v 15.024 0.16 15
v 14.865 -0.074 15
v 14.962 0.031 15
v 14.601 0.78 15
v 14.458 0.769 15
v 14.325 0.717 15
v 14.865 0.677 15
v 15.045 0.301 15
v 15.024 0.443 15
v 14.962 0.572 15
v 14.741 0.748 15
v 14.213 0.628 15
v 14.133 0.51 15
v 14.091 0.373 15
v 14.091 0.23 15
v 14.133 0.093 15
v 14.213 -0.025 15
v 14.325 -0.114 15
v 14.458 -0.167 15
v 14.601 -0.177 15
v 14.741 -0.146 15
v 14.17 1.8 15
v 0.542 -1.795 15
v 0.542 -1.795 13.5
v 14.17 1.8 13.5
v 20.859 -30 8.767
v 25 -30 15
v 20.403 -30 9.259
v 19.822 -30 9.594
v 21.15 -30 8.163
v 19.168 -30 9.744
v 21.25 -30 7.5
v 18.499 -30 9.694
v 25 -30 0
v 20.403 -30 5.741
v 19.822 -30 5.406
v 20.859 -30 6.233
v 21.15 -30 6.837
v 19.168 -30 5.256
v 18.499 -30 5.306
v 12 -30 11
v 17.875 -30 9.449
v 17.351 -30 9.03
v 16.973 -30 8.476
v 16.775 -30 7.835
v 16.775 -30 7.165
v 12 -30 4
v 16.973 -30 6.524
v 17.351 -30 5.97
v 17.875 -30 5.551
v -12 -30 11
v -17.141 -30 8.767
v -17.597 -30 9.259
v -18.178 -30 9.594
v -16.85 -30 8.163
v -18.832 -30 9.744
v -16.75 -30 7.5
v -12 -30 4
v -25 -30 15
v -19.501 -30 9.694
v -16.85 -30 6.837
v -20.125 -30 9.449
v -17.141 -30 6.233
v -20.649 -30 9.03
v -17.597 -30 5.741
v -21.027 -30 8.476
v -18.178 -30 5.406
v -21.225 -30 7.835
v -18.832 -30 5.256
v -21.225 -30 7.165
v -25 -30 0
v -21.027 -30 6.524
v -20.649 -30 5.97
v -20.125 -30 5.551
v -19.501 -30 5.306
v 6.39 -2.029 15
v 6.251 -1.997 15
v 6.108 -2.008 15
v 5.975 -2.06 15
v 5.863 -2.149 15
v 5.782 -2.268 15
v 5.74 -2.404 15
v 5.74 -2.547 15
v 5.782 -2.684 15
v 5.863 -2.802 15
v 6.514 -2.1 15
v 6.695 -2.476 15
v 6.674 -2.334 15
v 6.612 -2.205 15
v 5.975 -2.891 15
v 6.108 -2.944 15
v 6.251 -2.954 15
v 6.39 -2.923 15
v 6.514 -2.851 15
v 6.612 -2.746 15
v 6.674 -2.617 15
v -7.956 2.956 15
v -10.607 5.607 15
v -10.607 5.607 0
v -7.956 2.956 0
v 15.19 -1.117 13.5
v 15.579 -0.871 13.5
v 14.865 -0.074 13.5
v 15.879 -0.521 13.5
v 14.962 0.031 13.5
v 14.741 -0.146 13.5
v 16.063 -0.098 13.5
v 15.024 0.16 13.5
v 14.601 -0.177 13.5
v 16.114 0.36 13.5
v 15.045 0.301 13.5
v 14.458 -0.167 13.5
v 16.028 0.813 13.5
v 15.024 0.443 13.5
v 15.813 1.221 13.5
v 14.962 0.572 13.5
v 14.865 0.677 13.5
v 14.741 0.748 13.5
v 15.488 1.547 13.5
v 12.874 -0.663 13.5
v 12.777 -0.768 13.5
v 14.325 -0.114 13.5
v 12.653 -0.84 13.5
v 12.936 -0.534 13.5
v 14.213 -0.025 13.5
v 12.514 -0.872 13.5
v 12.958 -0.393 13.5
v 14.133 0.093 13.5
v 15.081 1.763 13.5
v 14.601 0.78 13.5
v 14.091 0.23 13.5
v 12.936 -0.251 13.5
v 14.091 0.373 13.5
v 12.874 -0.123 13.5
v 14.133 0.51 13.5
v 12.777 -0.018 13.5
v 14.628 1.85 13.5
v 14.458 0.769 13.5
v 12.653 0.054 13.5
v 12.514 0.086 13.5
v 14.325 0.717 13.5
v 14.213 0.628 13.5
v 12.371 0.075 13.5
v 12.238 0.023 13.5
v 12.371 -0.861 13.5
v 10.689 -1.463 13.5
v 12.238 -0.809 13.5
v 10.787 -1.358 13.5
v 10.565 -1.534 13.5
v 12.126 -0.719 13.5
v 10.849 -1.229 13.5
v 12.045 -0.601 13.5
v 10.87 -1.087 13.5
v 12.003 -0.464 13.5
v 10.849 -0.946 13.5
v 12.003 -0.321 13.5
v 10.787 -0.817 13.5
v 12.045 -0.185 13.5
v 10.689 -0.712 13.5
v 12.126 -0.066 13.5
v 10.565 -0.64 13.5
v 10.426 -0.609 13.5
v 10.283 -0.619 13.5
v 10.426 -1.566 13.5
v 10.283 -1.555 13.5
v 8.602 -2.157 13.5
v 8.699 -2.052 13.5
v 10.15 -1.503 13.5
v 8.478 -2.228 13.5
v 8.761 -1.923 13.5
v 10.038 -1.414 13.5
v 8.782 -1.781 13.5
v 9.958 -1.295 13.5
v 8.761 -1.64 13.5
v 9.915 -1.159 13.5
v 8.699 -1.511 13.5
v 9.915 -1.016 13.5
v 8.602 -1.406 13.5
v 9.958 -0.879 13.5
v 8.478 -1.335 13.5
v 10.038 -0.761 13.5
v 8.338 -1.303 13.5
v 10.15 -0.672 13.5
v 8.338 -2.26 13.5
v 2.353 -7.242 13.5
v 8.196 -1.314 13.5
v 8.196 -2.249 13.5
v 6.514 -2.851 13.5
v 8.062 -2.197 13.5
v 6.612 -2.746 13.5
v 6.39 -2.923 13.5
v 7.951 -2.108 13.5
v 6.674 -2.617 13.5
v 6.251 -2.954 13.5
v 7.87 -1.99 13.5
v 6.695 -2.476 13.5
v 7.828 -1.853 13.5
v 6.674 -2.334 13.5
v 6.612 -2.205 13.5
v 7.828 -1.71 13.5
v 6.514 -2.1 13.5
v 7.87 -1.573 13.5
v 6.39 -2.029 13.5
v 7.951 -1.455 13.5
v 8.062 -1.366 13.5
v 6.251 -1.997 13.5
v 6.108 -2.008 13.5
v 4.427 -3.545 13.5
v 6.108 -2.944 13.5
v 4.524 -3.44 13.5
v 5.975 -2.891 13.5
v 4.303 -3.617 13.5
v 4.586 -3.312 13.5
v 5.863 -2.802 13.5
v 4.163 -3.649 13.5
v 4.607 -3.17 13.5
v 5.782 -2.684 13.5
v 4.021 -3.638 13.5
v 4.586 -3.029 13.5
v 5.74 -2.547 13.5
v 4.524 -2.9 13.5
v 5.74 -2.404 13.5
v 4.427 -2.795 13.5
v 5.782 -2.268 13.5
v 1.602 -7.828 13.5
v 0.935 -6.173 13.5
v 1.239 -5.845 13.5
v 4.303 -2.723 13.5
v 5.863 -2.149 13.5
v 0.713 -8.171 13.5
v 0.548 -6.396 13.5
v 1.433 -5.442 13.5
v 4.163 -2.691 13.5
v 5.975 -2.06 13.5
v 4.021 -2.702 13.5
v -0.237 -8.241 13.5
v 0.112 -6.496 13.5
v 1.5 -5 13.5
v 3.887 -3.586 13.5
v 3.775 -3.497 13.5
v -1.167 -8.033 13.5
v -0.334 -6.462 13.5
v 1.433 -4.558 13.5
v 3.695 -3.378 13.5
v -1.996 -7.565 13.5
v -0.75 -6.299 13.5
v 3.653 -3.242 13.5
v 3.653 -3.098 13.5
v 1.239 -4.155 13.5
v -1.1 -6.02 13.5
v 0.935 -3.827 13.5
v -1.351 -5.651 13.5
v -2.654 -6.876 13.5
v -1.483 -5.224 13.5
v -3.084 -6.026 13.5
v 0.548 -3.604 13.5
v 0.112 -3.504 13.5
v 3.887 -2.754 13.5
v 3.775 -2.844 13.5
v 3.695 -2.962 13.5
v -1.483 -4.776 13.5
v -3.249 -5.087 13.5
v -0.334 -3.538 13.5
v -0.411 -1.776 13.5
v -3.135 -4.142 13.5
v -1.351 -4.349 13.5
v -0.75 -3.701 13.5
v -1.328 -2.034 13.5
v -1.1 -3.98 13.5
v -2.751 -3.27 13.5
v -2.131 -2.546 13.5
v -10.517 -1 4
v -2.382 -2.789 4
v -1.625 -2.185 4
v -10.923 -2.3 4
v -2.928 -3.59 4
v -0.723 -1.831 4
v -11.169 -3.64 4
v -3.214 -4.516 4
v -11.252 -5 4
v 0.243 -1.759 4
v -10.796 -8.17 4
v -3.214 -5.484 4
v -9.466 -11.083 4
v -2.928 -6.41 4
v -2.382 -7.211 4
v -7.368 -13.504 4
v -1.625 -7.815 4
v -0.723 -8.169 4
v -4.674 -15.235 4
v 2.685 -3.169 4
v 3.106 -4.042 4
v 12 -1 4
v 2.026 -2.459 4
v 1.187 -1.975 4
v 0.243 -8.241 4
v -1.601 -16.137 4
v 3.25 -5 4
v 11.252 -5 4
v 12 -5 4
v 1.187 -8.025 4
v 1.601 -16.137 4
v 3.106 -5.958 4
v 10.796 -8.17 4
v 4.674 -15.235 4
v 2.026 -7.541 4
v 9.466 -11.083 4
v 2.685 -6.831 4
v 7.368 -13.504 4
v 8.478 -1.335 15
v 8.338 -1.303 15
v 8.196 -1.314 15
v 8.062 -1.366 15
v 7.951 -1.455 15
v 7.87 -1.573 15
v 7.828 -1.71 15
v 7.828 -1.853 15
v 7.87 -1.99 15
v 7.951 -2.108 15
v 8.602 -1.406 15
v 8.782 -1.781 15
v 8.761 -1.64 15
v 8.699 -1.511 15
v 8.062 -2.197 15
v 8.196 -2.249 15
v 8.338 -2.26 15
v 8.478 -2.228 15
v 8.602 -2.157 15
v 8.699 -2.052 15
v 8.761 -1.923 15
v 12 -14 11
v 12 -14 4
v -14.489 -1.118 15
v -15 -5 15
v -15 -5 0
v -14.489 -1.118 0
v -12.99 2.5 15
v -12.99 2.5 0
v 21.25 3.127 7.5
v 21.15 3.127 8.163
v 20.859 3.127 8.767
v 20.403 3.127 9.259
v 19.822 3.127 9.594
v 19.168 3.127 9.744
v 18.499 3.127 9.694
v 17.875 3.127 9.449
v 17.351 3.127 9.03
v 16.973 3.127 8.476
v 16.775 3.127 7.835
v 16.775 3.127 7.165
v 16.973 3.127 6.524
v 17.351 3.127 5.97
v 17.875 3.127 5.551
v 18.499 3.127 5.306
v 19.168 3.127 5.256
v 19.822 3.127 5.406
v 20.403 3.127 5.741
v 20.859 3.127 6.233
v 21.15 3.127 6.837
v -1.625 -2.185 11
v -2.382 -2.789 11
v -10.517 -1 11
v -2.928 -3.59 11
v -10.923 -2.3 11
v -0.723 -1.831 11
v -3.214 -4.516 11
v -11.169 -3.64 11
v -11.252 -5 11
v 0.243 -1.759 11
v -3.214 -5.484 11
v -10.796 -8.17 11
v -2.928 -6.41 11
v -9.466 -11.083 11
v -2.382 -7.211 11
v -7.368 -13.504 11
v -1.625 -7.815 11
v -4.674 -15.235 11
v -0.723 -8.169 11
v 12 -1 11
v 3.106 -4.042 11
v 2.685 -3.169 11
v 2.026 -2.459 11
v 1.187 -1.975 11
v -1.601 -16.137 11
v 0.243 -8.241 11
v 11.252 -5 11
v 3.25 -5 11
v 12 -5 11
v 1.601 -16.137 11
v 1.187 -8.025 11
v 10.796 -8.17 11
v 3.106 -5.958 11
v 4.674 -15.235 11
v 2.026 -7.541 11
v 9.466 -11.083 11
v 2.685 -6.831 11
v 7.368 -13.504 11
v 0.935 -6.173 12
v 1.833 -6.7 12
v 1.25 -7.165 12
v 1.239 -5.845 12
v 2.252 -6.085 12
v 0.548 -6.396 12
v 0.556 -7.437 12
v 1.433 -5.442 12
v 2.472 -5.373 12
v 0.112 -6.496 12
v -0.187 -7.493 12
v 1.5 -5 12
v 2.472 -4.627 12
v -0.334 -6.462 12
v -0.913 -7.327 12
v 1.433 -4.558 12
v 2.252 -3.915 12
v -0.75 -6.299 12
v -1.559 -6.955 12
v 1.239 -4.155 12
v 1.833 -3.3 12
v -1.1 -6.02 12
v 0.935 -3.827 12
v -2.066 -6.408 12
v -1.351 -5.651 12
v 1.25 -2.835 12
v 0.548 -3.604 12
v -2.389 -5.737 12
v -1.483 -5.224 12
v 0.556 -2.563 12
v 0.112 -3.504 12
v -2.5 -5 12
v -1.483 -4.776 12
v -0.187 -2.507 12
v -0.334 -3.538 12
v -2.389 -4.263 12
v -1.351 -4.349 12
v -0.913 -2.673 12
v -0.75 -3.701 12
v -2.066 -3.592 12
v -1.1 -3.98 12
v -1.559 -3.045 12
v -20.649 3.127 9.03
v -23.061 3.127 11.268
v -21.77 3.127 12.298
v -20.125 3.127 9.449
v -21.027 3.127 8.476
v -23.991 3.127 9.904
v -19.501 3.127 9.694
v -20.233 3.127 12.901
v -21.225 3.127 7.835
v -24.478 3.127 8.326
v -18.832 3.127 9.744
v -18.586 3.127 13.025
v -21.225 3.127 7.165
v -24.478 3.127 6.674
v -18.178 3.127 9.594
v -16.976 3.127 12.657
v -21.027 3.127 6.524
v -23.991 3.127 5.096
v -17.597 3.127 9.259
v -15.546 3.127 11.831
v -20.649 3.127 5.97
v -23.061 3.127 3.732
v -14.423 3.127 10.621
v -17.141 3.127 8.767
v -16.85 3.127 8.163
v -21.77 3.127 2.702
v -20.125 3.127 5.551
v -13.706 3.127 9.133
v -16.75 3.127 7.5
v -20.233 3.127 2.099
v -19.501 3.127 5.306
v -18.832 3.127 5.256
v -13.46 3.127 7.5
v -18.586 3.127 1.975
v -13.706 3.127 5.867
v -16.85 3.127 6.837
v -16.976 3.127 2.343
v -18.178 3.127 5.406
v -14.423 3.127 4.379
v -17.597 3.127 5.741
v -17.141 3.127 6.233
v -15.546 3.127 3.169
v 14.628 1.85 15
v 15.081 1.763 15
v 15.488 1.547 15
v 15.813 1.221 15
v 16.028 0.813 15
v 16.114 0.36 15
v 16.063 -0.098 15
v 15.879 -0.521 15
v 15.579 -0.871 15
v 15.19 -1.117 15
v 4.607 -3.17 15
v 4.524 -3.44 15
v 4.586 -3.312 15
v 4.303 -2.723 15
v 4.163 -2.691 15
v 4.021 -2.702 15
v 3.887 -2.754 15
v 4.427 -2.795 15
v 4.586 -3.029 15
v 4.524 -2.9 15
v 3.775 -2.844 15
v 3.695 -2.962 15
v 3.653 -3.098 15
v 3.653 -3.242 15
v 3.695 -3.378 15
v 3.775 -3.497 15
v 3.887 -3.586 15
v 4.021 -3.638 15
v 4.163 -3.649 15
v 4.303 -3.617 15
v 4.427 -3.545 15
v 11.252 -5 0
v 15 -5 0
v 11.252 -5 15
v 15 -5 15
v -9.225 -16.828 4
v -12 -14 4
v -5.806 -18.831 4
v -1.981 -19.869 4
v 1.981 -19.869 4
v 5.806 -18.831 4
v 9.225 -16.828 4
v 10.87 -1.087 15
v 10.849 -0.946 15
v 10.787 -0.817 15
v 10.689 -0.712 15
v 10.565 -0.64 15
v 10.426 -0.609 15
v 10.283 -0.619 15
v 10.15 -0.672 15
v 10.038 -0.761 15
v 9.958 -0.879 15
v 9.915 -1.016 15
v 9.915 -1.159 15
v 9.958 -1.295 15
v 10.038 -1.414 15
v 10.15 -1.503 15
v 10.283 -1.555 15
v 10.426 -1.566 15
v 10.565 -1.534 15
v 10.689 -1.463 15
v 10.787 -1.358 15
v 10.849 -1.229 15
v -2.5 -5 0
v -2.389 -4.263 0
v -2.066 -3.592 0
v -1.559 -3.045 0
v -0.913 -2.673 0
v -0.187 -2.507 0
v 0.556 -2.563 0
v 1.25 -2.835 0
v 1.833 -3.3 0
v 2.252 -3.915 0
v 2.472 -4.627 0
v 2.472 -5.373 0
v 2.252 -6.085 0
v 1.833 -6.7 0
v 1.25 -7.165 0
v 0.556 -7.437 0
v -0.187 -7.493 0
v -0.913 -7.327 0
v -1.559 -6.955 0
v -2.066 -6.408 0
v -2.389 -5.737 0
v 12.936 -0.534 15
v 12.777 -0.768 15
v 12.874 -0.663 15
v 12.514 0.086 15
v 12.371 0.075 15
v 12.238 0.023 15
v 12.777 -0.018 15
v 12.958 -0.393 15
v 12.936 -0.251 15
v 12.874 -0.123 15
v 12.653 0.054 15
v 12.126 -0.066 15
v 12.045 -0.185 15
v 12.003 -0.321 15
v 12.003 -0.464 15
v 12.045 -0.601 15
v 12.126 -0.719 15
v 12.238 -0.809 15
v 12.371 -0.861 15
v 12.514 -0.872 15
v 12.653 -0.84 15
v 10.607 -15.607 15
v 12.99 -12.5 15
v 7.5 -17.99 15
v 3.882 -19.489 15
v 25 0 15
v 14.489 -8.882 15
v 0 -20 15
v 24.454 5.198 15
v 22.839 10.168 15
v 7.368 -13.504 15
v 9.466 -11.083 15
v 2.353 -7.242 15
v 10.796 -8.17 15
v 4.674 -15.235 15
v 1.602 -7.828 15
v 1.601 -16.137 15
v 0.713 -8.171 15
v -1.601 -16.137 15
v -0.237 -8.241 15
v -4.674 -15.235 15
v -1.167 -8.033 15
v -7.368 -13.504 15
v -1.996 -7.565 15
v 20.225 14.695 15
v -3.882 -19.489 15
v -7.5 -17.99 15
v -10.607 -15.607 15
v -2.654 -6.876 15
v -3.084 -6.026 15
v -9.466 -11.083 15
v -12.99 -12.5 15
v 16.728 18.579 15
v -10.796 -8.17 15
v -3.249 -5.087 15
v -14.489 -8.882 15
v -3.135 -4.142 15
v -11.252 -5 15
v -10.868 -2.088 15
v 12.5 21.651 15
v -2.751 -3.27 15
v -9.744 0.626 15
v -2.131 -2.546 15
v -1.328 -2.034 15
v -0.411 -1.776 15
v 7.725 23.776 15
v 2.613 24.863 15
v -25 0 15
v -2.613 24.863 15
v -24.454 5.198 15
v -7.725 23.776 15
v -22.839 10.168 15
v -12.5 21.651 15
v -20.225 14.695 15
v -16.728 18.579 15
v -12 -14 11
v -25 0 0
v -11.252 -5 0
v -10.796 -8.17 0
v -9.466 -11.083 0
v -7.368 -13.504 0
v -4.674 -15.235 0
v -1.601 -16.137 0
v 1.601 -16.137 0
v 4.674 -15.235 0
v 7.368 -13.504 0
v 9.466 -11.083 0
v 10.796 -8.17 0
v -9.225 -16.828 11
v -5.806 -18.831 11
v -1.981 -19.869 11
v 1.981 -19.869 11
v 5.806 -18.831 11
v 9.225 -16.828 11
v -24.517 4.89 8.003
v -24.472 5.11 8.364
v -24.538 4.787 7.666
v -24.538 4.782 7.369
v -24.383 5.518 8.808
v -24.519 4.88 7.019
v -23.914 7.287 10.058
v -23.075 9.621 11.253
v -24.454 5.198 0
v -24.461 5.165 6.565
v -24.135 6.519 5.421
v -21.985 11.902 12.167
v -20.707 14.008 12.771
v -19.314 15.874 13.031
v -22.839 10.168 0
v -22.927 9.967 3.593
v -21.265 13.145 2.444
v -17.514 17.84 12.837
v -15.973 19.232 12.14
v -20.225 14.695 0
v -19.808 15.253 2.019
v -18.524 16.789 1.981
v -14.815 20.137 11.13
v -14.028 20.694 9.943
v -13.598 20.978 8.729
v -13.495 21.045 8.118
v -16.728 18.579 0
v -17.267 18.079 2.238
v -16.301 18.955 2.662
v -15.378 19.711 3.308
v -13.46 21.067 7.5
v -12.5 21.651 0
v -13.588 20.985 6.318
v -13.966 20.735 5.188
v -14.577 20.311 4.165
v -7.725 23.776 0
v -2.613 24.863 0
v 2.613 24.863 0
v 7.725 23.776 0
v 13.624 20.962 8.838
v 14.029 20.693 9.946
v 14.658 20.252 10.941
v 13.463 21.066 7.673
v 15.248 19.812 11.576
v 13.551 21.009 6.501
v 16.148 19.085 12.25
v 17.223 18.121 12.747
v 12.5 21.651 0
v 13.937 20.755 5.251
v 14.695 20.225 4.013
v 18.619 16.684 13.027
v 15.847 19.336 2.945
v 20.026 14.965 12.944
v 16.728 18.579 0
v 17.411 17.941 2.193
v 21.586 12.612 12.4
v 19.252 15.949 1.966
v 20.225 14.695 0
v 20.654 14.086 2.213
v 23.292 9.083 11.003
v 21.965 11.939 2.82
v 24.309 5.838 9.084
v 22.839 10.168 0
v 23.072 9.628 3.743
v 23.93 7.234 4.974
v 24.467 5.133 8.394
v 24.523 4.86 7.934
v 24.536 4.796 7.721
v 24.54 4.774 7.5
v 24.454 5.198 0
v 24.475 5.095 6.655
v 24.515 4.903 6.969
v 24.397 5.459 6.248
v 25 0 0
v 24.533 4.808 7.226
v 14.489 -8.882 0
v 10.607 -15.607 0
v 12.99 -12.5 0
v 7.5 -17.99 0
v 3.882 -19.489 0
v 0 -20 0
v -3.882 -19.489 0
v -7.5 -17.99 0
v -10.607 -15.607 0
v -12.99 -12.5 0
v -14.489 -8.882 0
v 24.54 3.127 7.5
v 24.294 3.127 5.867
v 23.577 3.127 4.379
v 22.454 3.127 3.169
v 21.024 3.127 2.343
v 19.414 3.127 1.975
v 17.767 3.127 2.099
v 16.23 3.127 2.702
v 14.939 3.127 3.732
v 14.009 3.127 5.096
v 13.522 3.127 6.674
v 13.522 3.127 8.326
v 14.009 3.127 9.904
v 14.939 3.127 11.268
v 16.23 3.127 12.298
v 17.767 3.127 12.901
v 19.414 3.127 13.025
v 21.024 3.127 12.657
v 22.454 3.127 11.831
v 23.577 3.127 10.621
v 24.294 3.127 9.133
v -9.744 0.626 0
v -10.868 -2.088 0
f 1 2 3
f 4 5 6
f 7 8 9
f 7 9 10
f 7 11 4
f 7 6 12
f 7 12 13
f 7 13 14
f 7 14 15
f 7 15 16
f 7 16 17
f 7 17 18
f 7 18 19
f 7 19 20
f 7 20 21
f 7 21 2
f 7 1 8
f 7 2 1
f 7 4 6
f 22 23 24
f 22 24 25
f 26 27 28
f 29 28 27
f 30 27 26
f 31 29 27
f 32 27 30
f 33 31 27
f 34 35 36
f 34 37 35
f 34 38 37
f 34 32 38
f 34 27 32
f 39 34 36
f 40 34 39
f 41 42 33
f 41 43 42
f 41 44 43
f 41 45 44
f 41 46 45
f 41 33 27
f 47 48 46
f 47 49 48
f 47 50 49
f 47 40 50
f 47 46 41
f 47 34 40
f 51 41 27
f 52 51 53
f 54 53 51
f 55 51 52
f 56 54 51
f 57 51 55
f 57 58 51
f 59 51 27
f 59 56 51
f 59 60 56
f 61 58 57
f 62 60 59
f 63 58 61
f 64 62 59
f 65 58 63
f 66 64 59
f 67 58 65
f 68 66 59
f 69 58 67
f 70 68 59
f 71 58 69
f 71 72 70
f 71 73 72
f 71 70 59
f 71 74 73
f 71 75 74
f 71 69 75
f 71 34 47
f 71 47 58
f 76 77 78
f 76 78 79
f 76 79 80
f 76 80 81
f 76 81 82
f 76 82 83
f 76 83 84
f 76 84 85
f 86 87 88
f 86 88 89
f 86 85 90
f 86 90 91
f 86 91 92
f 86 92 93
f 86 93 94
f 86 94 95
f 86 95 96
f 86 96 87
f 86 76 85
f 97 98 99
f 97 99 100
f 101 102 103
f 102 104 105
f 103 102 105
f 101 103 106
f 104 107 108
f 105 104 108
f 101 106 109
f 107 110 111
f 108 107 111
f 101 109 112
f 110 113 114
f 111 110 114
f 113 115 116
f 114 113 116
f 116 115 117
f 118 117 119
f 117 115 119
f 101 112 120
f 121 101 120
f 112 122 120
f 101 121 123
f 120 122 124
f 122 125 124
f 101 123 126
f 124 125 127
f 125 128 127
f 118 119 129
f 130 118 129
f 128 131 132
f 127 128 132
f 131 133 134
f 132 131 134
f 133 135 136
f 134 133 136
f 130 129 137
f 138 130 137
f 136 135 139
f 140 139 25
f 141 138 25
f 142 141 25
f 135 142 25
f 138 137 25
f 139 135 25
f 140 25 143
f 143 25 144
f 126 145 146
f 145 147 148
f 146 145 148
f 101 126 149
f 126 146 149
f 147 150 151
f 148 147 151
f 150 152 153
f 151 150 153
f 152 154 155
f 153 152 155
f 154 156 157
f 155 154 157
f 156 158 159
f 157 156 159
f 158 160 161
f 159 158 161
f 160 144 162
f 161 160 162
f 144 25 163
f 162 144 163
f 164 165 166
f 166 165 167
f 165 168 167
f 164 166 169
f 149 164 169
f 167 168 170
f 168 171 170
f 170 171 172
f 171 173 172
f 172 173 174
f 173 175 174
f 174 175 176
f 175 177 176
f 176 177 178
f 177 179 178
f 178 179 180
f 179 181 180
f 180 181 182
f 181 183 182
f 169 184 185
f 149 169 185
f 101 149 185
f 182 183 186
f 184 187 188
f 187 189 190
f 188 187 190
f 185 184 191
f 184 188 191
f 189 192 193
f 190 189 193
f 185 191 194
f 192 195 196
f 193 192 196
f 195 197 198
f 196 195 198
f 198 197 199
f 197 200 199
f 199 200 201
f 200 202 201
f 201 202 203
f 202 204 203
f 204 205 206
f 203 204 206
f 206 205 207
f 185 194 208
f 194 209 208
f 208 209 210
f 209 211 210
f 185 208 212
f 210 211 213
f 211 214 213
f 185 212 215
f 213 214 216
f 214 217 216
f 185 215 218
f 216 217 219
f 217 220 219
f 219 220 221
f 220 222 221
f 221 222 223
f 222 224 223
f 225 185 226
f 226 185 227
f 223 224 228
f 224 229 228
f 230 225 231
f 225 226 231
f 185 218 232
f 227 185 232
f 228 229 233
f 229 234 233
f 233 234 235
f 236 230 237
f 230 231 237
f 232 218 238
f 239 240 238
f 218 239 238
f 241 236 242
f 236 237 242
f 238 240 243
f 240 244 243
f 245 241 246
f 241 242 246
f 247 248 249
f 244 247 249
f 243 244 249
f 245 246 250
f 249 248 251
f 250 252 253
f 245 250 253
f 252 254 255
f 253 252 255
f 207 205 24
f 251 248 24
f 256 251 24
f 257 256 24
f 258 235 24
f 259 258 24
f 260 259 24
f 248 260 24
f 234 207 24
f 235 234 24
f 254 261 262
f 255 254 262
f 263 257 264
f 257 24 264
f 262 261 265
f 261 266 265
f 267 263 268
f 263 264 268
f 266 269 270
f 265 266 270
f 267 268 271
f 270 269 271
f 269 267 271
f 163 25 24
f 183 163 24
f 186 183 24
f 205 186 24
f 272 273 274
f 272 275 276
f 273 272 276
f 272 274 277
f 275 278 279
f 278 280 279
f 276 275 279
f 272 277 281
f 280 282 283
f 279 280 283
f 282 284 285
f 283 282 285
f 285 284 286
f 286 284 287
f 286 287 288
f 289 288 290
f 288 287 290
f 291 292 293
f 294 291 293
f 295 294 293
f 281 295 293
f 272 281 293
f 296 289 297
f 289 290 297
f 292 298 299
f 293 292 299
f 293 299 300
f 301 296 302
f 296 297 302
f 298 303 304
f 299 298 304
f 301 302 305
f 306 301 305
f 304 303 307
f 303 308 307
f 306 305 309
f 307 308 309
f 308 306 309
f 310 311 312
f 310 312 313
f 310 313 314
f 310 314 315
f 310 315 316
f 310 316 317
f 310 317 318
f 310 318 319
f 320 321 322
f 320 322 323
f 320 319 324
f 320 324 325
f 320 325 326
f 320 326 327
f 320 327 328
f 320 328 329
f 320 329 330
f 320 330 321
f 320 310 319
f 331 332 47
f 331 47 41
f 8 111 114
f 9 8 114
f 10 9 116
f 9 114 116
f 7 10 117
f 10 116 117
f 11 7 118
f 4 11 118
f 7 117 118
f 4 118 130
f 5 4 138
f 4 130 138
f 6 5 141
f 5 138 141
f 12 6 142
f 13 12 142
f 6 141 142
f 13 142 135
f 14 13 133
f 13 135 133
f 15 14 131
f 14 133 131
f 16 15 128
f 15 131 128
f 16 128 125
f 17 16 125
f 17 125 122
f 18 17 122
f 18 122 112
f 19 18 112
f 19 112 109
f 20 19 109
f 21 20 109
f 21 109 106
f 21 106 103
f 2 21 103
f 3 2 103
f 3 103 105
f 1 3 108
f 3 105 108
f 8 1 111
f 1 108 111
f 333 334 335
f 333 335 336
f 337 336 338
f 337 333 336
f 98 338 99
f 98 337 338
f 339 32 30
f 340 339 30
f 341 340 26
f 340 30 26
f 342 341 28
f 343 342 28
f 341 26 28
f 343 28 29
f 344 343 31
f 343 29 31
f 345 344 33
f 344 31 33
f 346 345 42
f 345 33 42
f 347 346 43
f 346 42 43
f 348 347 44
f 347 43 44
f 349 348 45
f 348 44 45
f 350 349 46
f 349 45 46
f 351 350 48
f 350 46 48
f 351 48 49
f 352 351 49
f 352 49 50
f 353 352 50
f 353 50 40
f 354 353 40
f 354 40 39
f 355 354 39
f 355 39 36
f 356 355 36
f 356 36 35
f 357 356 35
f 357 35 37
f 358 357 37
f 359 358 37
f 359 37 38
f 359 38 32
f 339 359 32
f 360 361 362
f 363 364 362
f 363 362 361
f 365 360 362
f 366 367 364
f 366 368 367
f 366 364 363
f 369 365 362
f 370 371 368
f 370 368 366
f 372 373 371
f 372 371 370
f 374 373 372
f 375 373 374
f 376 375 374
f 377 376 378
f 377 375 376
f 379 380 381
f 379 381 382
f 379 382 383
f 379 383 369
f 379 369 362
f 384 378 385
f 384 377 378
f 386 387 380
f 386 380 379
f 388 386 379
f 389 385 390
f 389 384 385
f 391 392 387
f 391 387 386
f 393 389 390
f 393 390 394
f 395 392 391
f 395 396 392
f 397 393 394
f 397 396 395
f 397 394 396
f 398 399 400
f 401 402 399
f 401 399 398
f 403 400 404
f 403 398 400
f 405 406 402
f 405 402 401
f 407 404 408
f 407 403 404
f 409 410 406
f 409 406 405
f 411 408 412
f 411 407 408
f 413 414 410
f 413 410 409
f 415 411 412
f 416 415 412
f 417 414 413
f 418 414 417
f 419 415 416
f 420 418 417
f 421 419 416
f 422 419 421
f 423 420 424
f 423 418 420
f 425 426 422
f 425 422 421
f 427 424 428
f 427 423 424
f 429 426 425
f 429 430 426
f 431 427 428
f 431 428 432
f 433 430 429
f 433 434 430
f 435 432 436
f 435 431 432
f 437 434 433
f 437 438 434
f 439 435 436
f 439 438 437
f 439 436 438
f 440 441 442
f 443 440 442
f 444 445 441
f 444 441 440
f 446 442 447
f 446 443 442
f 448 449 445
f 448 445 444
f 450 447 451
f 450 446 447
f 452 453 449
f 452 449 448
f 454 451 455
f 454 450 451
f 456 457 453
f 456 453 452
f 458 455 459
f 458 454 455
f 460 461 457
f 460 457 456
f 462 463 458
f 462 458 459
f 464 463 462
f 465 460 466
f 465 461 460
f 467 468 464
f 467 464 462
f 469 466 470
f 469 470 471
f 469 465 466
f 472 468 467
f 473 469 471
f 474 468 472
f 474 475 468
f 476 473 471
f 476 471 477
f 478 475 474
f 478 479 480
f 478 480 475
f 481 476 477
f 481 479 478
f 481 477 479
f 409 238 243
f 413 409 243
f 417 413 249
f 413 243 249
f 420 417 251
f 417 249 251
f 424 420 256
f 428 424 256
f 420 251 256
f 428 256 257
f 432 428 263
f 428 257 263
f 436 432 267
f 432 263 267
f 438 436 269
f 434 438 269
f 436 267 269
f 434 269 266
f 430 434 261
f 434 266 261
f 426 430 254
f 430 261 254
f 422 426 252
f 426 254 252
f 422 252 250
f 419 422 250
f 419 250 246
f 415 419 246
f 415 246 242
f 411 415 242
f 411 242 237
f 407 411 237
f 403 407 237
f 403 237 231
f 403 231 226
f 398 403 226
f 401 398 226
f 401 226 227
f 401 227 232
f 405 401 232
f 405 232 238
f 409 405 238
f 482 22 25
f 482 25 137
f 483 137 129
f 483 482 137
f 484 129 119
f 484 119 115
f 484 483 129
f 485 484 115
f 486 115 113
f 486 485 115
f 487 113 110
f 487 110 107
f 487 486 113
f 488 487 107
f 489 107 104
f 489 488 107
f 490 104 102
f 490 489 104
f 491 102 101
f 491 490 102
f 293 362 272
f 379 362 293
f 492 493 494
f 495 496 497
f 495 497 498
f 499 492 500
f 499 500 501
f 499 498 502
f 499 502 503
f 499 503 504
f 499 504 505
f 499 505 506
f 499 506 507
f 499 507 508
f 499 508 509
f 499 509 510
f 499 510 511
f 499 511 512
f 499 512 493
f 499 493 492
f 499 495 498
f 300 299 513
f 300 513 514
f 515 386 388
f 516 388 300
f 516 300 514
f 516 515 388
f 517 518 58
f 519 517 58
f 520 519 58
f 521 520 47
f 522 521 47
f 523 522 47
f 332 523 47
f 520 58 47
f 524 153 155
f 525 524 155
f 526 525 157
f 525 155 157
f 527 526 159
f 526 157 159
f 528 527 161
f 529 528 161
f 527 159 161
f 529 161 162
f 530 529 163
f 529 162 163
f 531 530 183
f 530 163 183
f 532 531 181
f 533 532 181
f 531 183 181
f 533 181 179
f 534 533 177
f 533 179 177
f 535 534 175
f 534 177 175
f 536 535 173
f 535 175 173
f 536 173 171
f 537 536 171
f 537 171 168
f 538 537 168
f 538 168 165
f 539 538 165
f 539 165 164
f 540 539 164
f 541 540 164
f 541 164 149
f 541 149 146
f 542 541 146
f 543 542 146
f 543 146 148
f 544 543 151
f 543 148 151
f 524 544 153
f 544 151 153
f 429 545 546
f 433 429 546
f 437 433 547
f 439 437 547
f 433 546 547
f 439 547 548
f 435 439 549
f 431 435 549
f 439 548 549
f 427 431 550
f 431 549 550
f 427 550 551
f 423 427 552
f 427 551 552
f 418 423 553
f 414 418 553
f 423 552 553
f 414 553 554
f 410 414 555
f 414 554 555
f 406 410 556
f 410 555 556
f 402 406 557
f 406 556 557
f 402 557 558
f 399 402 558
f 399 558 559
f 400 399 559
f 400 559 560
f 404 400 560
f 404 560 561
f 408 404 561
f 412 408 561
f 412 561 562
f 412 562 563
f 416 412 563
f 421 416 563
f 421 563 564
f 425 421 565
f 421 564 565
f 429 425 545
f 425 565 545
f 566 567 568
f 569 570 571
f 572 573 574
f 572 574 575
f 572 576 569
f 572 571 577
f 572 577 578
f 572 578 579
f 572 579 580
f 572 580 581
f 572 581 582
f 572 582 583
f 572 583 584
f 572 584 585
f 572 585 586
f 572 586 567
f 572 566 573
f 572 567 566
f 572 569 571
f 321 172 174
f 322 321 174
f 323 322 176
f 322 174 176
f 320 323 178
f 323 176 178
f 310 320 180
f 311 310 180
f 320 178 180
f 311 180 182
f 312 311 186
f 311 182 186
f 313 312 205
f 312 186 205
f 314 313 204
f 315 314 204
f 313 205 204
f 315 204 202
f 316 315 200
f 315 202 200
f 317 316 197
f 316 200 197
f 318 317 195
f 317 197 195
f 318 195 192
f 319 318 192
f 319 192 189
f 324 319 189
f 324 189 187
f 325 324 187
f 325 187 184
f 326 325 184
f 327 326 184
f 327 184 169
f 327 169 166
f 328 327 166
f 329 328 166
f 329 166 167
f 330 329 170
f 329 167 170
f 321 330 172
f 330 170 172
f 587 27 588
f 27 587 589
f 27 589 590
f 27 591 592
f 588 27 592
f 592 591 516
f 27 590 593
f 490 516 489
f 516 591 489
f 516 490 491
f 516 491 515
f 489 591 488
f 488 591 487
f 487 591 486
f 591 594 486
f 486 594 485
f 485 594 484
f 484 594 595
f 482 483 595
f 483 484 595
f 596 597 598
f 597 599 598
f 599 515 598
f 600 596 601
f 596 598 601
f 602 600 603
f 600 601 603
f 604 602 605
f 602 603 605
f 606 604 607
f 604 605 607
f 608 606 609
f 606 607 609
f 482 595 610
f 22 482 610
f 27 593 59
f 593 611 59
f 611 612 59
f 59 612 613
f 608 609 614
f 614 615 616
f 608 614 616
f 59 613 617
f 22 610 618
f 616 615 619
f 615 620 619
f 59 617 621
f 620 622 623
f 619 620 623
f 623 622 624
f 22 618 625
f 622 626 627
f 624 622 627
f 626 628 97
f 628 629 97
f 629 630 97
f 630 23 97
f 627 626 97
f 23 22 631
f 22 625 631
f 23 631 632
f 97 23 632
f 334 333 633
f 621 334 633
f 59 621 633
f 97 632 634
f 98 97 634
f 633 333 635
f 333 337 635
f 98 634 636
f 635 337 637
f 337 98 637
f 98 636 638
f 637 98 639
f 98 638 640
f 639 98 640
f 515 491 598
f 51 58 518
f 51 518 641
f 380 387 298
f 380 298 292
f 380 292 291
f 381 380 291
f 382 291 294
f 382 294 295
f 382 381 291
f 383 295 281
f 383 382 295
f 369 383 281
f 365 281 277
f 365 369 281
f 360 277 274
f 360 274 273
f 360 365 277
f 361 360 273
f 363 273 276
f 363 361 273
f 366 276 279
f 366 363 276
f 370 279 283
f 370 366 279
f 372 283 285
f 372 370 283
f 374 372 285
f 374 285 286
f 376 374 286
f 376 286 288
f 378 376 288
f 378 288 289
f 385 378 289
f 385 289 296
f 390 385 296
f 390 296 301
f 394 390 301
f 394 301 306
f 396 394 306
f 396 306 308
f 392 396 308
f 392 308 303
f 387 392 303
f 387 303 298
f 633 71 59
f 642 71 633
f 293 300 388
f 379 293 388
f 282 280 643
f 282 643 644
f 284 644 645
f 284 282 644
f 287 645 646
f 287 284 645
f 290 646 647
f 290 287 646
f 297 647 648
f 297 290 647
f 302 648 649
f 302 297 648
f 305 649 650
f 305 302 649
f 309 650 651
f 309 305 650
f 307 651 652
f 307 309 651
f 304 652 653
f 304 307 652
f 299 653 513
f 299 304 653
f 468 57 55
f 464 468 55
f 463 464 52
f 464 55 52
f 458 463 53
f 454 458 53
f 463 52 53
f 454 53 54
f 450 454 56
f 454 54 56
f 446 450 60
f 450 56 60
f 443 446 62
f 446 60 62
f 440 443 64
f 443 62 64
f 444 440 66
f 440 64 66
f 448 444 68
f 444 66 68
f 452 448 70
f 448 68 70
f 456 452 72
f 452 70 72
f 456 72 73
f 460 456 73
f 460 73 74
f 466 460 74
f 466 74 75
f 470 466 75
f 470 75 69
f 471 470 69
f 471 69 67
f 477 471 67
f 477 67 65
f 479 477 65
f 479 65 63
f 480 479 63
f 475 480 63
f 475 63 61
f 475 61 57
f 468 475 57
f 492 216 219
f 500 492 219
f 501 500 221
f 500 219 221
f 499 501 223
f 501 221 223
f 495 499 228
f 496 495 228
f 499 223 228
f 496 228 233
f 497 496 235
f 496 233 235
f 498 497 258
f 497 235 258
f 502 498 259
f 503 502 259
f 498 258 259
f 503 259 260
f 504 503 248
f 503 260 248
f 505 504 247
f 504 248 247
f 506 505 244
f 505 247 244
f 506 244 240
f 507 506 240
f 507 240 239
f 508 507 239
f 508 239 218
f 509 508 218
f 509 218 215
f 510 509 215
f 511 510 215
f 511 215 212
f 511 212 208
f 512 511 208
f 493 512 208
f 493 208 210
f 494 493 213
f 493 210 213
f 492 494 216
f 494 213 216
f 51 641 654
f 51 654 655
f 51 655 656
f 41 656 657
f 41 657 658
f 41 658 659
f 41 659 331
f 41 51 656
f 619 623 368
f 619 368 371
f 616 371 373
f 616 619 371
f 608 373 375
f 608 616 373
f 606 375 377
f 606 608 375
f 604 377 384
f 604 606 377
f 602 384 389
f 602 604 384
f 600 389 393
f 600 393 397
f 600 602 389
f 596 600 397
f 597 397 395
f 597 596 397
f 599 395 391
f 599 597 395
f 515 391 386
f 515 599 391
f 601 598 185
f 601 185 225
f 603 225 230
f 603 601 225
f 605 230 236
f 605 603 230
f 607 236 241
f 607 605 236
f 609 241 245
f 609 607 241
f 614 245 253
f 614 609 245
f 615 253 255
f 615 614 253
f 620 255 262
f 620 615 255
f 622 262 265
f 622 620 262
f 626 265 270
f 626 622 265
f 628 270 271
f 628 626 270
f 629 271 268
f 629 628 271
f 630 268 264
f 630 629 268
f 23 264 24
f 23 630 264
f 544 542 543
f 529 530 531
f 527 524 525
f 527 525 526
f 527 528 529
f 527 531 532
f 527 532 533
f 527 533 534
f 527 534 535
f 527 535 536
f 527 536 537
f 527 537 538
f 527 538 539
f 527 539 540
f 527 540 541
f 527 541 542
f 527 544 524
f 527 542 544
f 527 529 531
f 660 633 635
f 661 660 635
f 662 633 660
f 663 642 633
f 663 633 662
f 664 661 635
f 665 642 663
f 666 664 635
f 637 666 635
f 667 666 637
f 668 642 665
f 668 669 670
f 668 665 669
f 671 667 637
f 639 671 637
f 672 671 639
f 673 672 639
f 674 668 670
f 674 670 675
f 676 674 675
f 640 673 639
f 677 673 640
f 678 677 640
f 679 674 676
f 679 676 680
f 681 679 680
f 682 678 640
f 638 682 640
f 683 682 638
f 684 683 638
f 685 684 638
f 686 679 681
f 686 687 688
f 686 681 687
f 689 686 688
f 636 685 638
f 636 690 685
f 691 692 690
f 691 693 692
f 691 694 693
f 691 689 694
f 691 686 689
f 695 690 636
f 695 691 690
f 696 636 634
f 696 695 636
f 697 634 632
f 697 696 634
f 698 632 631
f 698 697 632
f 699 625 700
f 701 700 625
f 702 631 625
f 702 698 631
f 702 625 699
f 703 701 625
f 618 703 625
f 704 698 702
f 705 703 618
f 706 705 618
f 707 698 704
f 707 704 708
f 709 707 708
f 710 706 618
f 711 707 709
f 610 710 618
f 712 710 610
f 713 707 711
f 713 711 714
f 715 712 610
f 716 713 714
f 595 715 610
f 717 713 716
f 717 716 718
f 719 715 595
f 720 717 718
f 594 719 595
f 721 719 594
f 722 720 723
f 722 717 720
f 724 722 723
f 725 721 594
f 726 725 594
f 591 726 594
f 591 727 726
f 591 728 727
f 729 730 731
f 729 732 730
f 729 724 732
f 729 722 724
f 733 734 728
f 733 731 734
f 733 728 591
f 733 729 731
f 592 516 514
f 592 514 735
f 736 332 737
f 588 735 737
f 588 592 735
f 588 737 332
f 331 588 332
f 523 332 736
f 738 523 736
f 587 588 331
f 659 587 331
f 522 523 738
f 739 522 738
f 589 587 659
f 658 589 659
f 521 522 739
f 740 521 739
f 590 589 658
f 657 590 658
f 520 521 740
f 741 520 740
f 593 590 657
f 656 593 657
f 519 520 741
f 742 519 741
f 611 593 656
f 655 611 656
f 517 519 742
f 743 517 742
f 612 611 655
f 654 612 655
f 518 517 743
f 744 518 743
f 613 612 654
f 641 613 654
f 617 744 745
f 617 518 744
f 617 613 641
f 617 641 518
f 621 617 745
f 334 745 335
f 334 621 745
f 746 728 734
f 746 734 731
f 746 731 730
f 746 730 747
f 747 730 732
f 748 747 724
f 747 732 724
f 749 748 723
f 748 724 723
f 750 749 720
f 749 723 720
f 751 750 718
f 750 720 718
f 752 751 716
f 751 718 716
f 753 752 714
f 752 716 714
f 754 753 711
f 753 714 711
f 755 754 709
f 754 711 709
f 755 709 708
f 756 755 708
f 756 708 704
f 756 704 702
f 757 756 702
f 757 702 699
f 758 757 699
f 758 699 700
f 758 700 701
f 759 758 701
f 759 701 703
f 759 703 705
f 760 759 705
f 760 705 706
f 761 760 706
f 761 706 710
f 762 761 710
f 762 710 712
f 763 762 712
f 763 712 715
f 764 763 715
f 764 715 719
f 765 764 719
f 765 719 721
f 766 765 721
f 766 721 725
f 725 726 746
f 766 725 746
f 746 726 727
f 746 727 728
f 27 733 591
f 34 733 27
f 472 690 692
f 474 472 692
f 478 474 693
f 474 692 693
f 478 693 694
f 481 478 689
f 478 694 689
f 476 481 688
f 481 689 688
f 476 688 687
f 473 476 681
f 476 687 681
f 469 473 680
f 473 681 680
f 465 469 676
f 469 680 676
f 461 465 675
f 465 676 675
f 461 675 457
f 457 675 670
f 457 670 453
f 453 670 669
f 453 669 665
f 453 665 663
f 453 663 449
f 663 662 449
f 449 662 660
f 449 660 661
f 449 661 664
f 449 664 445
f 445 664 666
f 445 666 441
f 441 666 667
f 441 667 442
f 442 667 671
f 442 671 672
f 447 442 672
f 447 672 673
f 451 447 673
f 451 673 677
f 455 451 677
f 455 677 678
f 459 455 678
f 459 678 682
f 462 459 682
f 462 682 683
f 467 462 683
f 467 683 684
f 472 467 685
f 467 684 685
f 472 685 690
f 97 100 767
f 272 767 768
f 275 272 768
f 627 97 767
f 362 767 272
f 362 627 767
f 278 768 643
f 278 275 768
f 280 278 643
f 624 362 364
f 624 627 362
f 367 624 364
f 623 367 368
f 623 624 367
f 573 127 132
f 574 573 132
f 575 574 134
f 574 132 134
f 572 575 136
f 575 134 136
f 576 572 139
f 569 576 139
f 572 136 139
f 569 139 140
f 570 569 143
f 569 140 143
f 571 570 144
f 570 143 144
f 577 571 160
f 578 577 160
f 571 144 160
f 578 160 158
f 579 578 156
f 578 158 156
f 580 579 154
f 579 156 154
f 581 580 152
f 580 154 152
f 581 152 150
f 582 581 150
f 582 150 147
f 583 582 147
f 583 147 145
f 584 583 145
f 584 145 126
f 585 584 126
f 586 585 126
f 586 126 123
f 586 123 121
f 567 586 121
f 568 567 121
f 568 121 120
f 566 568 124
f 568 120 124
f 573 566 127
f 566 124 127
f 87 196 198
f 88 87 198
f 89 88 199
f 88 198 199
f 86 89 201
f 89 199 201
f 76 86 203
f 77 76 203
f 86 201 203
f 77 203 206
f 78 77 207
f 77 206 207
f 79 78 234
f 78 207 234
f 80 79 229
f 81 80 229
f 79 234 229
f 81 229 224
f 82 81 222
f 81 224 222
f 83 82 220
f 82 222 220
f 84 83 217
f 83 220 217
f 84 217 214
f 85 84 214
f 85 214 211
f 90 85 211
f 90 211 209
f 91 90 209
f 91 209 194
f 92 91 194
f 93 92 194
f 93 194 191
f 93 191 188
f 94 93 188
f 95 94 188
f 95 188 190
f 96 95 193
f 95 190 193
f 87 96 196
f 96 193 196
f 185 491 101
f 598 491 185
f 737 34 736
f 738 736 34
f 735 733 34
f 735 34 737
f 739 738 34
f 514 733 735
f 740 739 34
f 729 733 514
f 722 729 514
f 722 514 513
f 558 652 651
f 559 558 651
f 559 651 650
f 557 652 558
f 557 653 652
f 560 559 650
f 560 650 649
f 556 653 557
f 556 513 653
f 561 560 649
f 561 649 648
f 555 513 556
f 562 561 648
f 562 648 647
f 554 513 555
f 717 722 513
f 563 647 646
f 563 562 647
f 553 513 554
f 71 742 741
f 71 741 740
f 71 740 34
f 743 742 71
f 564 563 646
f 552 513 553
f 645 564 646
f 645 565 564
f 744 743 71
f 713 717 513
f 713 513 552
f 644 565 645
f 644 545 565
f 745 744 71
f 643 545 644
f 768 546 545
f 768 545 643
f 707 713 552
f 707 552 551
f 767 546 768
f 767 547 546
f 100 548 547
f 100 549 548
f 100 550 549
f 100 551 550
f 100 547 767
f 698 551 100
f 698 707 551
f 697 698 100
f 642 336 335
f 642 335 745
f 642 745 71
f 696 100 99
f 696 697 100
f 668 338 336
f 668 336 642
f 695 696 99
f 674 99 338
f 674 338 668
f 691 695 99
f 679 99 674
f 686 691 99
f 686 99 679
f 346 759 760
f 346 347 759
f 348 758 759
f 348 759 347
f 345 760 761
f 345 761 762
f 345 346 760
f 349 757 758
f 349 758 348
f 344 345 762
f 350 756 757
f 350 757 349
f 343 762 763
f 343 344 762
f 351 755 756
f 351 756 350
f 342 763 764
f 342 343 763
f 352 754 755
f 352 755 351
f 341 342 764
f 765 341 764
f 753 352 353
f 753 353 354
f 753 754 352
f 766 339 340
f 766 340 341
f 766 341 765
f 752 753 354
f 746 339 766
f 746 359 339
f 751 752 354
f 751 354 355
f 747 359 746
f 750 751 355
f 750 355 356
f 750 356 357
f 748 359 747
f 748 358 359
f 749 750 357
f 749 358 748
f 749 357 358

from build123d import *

# Parameters (mm, degrees)
BOSS_EXTRUDE1_DEPTH = 15
CUT_EXTRUDE1_REACH  = 57
SKETCH2_R           = 2.25
SKETCH3_R           = 5.54
CUT_EXTRUDE2_DEPTH  = 21
SKETCH4_W           = 24
SKETCH4_H           = 7
CUT_EXTRUDE3_DEPTH  = 29
CUT_EXTRUDE4_REACH  = 17
CUT_EXTRUDE5_DEPTH  = 1.5
SKETCH7_R           = 3.25
BOSS_EXTRUDE2_DEPTH = 13.5
CUT_EXTRUDE6_REACH  = 15.5
SKETCH8_R           = 1.5
SKETCH9_R           = 2.5
CUT_EXTRUDE7_DEPTH  = 12
SKETCH10_R          = 0.48
BOSS_EXTRUDE3_DEPTH = 1.5


with BuildPart() as part:
    # Sketch1 → Boss-Extrude1 (new body)
    with BuildSketch(Plane.XY):
        with BuildLine():
            Line((25, 0), (25, -30))
            Line((25, -30), (-25, -30))
            Line((-25, -30), (-25, 0))
            ThreePointArc((-25, 0), (0, 25), (25, 0))
        make_face()
    extrude(amount=BOSS_EXTRUDE1_DEPTH)

    # Sketch2 → Cut-Extrude1 (cut, up to next)
    with BuildSketch(Plane.XZ.offset(30), mode=Mode.PRIVATE) as cut_extrude1_sk1:
        with Locations((-19, 7.5)):
            Circle(SKETCH2_R)
    cut_extrude1_tool1 = extrude(cut_extrude1_sk1.sketch, amount=-CUT_EXTRUDE1_REACH, mode=Mode.PRIVATE) & part.part
    add(cut_extrude1_tool1.solids().sort_by_distance((-19, -30, 7.5))[0], mode=Mode.SUBTRACT)
    # Sketch2 → Cut-Extrude1 (cut, up to next)
    with BuildSketch(Plane.XZ.offset(30), mode=Mode.PRIVATE) as cut_extrude1_sk2:
        with Locations((19, 7.5)):
            Circle(SKETCH2_R)
    cut_extrude1_tool2 = extrude(cut_extrude1_sk2.sketch, amount=-CUT_EXTRUDE1_REACH, mode=Mode.PRIVATE) & part.part
    add(cut_extrude1_tool2.solids().sort_by_distance((19, -30, 7.5))[0], mode=Mode.SUBTRACT)

    # Sketch3 → Cut-Extrude2 (cut)
    with BuildSketch(Plane(origin=(0, 24.127056635, 0), x_dir=(1, 0, 0), z_dir=(0, 1, 0))):
        with Locations((19, -7.5)):
            Circle(SKETCH3_R)
        with Locations((-19, -7.5)):
            Circle(SKETCH3_R)
    extrude(amount=-CUT_EXTRUDE2_DEPTH, mode=Mode.SUBTRACT)

    # Sketch4 → Cut-Extrude3 (cut)
    with BuildSketch(Plane.XZ.offset(30)):
        with Locations((0, 7.5)):
            Rectangle(SKETCH4_W, SKETCH4_H)
    extrude(amount=-CUT_EXTRUDE3_DEPTH, mode=Mode.SUBTRACT)

    # Sketch5 → Cut-Extrude4 (cut, up to next)
    with BuildSketch(Plane.XY.offset(15), mode=Mode.PRIVATE) as cut_extrude4_sk1:
        with BuildLine():
            Line((11.251747285, -5), (15, -5))
            ThreePointArc((15, -5), (0, -20), (-15, -5))
            ThreePointArc((-15, -5), (-13.858192988, 0.740251485), (-10.606601718, 5.606601718))
            Line((-10.606601718, 5.606601718), (-7.956186805, 2.956186805))
            ThreePointArc((-7.956186805, 2.956186805), (-10.395259022, -0.694142729), (-11.251747285, -5))
            ThreePointArc((-11.251747285, -5), (0, -16.251747285), (11.251747285, -5))
        make_face()
    cut_extrude4_tool1 = extrude(cut_extrude4_sk1.sketch, amount=-CUT_EXTRUDE4_REACH, mode=Mode.PRIVATE) & part.part
    add(cut_extrude4_tool1.solids().sort_by_distance((13.125874, -5.394423, 15))[0], mode=Mode.SUBTRACT)

    # Sketch6 → Cut-Extrude5 (cut)
    with BuildSketch(Plane.XY.offset(15)):
        with BuildLine():
            Line((0.541549319, -1.795436951), (14.169837516, 1.800031788))
            ThreePointArc((14.169837516, 1.800031788), (16.028383105, 0.812877901), (15.18982596, -1.117274015))
            Line((15.18982596, -1.117274015), (2.352905683, -7.241948894))
            ThreePointArc((2.352905683, -7.241948894), (-3.083924533, -6.02562638), (0.541549319, -1.795436951))
        make_face()
    extrude(amount=-CUT_EXTRUDE5_DEPTH, mode=Mode.SUBTRACT)

    # Sketch7 → Boss-Extrude2 (add)
    with BuildSketch(Plane.XY.offset(13.5)):
        with Locations((0, -5)):
            Circle(SKETCH7_R)
    extrude(amount=-BOSS_EXTRUDE2_DEPTH)

    # Sketch8 → Cut-Extrude6 (cut, up to next)
    with BuildSketch(Plane.XY.offset(13.5), mode=Mode.PRIVATE) as cut_extrude6_sk1:
        with Locations((0, -5)):
            Circle(SKETCH8_R)
    cut_extrude6_tool1 = extrude(cut_extrude6_sk1.sketch, amount=-CUT_EXTRUDE6_REACH, mode=Mode.PRIVATE) & part.part
    add(cut_extrude6_tool1.solids().sort_by_distance((0, -5, 13.5))[0], mode=Mode.SUBTRACT)

    # Sketch9 → Cut-Extrude7 (cut)
    with BuildSketch(Plane(origin=(0, 0, 0), x_dir=(-1, 0, 0), z_dir=(0, 0, -1))):
        with Locations((0, -5)):
            Circle(SKETCH9_R)
    extrude(amount=-CUT_EXTRUDE7_DEPTH, mode=Mode.SUBTRACT)

    # Sketch10 → Boss-Extrude3 (add)
    with BuildSketch(Plane.XY.offset(13.5)):
        with Locations((14.565235622, 0.301312222)):
            Circle(SKETCH10_R)
        with Locations((12.477655938, -0.392957944)):
            Circle(SKETCH10_R)
        with Locations((10.390076254, -1.087228109)):
            Circle(SKETCH10_R)
        with Locations((8.30249657, -1.781498274)):
            Circle(SKETCH10_R)
        with Locations((6.214916885, -2.475768439)):
            Circle(SKETCH10_R)
        with Locations((4.127337201, -3.170038604)):
            Circle(SKETCH10_R)
    extrude(amount=BOSS_EXTRUDE3_DEPTH)


solid = part.part
